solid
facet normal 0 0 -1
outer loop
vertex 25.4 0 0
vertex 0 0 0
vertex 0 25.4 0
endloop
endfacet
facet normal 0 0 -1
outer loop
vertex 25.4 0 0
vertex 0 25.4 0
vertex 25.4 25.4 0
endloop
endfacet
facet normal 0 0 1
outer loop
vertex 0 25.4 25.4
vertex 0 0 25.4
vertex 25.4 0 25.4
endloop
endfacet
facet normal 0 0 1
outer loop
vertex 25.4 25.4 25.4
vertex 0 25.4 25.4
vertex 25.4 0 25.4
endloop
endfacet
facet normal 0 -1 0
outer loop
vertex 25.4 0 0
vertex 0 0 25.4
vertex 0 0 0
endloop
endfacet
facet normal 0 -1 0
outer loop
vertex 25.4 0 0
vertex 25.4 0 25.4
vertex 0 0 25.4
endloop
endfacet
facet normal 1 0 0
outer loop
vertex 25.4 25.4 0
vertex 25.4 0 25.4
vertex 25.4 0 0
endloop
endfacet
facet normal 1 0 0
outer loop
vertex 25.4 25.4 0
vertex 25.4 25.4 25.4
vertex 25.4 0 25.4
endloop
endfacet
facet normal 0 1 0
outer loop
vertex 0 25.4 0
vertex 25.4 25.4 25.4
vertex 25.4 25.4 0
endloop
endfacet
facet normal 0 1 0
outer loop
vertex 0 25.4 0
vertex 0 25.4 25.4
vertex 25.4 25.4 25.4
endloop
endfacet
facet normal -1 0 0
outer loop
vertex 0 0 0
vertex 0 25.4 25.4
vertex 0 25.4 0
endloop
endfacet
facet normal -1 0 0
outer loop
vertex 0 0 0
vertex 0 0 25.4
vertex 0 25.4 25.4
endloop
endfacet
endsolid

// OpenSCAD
// Unit of length: Unit.MM
linear_extrude(height = 25.4, center = false, twist = 0.0, scale = 1.0, $fs = 0.01)
{
   square(size = 25.4, center = false);
}
